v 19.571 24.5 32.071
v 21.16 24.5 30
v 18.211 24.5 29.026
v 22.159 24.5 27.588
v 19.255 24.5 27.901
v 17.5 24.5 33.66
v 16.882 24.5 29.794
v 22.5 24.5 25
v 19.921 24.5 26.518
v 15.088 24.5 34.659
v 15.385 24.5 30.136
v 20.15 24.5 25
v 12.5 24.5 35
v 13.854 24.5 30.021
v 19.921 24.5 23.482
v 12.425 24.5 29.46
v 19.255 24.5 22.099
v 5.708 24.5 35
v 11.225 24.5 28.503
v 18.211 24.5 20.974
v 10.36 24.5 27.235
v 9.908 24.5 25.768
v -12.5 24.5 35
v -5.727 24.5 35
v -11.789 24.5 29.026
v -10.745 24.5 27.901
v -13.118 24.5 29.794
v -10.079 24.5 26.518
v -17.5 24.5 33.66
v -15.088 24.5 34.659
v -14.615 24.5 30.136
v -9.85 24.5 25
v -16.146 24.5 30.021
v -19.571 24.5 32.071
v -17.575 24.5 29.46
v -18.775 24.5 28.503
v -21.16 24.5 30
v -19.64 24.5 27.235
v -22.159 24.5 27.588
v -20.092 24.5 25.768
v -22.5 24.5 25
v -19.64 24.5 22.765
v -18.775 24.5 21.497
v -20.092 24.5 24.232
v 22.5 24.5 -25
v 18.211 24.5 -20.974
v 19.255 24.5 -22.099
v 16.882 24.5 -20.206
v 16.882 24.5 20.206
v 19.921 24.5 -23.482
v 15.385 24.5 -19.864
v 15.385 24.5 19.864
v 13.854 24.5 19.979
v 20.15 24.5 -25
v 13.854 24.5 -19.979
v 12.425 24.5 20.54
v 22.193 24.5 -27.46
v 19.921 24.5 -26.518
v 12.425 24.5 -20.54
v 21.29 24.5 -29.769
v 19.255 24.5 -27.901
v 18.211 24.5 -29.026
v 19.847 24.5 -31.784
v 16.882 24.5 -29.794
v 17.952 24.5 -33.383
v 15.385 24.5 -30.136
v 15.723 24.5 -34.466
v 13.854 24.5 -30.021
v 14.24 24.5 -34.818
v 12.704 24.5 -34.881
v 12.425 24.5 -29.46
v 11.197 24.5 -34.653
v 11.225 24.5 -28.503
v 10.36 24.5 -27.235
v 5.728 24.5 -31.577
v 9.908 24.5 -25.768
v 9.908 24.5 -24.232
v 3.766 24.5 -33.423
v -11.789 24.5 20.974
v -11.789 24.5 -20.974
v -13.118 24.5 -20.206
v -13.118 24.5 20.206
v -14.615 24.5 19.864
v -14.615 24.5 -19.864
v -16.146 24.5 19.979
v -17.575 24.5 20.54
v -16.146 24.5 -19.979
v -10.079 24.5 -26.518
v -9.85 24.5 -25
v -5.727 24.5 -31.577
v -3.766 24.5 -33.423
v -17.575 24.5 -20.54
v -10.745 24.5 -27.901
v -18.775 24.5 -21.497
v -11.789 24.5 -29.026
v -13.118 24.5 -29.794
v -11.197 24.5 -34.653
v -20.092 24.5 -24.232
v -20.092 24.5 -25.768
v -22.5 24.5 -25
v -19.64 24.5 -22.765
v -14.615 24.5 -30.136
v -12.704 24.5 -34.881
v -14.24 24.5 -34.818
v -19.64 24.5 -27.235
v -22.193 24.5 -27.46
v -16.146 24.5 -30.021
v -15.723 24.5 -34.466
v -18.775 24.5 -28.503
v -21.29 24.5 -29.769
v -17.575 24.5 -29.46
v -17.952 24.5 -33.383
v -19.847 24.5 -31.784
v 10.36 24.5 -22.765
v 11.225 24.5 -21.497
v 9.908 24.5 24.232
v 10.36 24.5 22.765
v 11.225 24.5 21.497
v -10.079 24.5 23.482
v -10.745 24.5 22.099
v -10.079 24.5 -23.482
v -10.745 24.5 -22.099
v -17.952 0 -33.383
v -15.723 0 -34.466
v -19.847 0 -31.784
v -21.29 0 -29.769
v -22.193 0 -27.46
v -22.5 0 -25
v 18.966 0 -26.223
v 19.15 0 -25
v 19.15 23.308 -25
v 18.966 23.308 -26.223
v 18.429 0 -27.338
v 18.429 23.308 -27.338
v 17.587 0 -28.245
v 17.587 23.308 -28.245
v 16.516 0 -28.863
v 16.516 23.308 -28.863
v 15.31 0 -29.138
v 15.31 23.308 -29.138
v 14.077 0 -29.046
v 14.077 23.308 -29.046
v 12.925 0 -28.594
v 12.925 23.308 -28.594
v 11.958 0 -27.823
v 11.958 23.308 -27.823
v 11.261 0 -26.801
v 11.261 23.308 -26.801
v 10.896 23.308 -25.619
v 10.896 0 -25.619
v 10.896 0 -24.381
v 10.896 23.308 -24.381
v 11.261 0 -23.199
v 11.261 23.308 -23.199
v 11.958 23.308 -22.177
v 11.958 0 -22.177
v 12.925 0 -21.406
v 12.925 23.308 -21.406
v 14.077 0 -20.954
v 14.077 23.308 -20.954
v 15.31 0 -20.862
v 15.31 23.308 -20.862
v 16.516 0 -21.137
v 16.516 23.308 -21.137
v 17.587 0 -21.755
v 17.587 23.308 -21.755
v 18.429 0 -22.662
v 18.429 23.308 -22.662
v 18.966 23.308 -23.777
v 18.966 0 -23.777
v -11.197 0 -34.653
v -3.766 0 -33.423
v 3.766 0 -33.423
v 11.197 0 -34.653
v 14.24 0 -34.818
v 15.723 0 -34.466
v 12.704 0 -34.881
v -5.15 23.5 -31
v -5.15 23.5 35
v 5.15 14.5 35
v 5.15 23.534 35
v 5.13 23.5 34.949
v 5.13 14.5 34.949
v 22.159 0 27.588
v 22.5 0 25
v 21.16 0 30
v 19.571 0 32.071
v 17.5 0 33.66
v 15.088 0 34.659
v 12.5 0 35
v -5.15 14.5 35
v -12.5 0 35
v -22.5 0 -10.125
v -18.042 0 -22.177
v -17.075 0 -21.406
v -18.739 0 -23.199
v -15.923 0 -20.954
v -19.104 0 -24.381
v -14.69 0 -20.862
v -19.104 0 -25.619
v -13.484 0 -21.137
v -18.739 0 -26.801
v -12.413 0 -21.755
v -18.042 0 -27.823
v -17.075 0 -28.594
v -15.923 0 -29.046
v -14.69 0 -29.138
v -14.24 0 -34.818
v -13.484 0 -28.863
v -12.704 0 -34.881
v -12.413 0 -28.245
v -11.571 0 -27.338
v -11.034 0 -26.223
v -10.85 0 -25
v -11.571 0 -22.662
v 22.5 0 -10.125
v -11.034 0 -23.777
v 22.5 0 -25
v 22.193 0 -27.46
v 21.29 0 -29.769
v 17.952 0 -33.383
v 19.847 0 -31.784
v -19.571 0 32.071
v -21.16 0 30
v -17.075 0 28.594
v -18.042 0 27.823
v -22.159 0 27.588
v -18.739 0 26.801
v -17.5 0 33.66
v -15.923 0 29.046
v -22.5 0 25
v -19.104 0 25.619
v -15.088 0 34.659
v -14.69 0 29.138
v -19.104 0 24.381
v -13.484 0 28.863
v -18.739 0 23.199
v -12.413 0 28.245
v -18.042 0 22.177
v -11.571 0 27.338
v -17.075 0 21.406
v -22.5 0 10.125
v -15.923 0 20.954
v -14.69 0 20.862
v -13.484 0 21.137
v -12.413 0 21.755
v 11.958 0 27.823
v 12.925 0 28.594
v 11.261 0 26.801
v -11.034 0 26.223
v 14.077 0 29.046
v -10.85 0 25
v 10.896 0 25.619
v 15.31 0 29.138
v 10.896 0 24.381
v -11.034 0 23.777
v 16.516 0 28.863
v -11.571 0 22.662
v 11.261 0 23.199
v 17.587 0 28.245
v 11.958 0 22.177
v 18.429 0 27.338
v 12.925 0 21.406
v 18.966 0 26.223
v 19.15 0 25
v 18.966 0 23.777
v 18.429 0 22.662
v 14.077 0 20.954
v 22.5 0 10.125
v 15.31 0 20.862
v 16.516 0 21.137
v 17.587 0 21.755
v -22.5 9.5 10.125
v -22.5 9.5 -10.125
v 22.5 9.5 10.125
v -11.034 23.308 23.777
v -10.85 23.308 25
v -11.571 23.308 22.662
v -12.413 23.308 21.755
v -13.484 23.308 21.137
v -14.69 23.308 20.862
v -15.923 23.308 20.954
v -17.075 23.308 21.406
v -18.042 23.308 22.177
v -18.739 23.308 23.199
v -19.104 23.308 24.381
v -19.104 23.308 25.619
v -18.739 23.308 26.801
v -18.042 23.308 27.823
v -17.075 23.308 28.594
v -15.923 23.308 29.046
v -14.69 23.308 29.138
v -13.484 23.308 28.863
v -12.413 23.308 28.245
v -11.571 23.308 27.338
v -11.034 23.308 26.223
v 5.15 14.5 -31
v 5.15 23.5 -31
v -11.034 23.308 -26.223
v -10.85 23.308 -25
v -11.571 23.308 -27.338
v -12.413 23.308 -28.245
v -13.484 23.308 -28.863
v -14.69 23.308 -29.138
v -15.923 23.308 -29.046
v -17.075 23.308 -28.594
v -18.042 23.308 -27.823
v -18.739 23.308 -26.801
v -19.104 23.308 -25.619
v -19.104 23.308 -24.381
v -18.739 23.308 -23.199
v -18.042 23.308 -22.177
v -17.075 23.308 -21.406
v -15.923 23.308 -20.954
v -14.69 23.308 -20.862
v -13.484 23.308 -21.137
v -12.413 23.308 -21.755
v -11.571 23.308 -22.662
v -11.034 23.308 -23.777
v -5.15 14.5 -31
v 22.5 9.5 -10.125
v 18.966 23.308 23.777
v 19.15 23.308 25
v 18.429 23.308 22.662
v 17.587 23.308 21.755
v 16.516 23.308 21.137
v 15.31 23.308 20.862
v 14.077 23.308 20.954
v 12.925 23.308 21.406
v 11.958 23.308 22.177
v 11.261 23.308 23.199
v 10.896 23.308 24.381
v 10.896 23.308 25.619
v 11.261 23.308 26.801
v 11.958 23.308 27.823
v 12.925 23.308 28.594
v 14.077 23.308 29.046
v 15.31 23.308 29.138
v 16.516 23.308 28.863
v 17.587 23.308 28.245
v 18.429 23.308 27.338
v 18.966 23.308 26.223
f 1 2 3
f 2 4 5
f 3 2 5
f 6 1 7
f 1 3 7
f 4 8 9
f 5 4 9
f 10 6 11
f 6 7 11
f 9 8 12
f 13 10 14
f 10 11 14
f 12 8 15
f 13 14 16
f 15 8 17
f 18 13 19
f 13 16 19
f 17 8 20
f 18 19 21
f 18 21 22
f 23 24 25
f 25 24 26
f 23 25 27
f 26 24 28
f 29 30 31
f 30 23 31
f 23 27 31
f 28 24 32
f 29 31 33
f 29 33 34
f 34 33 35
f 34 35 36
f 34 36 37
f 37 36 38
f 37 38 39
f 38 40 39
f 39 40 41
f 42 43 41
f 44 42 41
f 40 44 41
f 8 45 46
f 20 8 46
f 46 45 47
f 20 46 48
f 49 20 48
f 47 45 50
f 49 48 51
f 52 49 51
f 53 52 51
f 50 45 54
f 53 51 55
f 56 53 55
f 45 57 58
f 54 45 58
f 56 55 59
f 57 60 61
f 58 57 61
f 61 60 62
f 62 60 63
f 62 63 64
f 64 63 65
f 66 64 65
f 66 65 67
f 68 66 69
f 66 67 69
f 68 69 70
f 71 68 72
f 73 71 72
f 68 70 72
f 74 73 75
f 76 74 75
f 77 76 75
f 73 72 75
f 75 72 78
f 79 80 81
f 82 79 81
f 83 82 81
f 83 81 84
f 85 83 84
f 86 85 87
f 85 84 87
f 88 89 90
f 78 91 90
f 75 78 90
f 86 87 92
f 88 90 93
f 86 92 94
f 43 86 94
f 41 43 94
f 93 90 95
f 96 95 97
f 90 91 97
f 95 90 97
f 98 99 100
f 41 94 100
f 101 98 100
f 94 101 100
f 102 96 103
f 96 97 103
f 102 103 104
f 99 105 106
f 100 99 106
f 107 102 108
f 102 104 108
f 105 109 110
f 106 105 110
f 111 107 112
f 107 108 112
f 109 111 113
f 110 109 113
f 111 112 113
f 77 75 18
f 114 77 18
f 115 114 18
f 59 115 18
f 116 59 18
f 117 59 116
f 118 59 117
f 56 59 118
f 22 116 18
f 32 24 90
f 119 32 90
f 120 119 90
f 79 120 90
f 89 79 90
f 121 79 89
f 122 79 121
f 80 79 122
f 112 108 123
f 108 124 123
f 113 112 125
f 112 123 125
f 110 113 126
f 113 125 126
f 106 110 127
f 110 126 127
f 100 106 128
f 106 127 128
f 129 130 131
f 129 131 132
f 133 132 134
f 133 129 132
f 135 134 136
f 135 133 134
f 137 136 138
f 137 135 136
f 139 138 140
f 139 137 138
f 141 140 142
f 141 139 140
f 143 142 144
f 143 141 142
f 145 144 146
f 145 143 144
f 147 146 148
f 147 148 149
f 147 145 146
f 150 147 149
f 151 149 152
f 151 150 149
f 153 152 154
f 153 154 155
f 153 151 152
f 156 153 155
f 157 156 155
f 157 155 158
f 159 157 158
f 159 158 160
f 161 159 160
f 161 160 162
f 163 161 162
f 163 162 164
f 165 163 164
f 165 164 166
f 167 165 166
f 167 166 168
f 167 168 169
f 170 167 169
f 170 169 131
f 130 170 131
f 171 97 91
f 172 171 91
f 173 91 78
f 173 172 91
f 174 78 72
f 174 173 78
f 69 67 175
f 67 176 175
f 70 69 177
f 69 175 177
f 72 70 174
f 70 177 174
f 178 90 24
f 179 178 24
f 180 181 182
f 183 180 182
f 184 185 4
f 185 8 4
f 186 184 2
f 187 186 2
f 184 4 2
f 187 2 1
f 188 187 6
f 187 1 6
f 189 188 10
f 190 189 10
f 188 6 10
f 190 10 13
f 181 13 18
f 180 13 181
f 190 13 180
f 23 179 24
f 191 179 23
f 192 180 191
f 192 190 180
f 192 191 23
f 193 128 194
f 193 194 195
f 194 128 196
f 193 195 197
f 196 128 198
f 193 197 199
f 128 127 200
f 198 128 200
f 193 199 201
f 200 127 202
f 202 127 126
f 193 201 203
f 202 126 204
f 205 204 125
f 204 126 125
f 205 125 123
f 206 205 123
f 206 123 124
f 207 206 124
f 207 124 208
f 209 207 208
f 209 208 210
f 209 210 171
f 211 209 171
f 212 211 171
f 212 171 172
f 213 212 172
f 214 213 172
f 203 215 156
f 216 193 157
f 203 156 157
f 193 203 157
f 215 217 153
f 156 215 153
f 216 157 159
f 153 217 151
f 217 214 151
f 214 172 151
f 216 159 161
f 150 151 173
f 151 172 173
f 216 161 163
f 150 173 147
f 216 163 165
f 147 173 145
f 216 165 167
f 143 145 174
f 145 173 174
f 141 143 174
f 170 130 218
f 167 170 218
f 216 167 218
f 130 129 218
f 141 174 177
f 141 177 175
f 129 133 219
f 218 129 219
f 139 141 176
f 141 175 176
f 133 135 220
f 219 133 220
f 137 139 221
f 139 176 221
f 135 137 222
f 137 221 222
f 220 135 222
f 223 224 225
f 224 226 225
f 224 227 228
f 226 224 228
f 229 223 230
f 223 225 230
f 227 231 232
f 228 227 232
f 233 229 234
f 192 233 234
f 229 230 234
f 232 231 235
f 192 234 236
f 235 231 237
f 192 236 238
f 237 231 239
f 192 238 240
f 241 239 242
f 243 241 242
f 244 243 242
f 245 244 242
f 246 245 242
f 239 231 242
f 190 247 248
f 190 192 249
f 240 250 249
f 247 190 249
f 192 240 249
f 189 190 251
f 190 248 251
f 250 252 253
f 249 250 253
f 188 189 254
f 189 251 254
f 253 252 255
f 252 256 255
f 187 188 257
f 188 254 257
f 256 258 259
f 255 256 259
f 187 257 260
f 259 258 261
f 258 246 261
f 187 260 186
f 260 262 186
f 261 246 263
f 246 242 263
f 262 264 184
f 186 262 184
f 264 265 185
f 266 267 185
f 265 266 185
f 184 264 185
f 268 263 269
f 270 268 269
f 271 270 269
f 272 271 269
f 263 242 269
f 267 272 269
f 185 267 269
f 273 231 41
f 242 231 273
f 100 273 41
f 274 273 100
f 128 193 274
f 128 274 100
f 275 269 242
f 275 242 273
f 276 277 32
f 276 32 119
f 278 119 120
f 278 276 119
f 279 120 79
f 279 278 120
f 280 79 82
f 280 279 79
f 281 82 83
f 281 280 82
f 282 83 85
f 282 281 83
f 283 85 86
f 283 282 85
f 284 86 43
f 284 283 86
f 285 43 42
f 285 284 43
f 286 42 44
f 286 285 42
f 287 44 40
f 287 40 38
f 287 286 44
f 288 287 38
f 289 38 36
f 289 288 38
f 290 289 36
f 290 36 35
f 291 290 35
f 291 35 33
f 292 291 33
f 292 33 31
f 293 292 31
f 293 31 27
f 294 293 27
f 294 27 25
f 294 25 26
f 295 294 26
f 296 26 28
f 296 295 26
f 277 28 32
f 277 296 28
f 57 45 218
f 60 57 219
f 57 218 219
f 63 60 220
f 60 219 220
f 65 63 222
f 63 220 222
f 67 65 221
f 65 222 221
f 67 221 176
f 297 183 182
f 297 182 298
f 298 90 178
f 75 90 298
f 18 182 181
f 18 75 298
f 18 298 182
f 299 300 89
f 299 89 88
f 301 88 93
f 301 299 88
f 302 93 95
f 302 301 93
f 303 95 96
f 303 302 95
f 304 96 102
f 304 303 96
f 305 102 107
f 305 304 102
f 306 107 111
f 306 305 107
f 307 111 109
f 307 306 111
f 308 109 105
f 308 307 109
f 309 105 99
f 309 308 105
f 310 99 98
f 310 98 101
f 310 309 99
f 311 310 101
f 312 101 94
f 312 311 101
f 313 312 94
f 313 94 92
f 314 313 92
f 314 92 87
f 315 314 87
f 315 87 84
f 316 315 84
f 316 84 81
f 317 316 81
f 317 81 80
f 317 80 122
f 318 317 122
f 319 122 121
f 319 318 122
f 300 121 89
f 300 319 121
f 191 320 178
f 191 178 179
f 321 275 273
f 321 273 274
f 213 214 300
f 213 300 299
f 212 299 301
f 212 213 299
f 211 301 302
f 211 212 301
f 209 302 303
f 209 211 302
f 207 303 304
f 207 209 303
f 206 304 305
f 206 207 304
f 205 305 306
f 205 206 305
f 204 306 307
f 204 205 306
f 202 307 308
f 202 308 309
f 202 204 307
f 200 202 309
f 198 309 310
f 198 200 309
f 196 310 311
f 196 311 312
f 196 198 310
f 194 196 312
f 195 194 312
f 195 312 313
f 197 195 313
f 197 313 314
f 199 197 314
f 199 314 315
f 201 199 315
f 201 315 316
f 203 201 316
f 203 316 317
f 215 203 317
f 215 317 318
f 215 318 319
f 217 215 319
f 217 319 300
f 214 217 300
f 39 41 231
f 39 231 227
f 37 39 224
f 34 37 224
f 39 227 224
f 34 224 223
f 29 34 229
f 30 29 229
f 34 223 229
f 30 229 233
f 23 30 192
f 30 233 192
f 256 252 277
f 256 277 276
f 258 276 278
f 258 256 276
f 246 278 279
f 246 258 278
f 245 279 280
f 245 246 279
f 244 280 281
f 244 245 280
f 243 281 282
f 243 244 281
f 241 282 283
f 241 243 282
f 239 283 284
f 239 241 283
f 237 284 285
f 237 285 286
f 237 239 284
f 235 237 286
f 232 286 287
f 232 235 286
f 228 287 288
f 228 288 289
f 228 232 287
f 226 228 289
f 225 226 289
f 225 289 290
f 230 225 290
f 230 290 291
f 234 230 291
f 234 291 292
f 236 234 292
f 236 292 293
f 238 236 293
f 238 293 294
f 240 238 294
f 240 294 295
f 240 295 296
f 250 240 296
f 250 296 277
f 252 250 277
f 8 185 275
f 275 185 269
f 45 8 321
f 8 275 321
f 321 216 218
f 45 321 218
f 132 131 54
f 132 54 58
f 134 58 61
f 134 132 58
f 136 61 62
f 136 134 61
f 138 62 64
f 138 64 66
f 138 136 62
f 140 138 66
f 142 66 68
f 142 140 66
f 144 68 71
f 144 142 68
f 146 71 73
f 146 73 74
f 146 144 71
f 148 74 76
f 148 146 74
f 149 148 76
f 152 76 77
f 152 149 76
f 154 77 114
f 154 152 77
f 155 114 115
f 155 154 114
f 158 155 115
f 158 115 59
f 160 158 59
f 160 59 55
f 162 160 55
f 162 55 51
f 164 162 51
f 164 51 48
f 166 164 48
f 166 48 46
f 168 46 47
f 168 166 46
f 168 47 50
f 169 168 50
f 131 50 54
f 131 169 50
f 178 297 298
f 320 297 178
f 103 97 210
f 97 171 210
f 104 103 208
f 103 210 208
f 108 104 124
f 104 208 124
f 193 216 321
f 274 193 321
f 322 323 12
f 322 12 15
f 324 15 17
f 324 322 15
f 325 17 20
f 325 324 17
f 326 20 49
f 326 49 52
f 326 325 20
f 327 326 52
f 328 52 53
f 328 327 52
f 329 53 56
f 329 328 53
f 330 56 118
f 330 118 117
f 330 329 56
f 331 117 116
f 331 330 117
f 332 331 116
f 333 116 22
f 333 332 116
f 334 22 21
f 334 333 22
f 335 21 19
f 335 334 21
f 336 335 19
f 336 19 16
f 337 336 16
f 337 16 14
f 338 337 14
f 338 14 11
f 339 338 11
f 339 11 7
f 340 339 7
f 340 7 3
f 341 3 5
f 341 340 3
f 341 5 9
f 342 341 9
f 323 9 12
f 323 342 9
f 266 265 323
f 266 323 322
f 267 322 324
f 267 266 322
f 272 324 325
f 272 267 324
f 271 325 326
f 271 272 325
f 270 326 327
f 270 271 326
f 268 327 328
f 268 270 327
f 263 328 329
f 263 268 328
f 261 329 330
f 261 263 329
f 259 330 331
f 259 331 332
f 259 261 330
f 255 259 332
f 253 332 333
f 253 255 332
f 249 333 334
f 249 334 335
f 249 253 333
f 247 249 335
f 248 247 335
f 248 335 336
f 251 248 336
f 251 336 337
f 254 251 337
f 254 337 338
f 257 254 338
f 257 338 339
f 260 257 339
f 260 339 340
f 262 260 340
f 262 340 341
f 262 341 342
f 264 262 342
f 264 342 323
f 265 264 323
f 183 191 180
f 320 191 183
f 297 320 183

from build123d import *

# Parameters (mm, degrees)
SKETCH1_W               = 45
SKETCH1_H               = 70
BOSS_EXTRUDE1_DEPTH     = 14.5
SKETCH2_W               = 20.25
SKETCH2_H               = 9.5
CUT_EXTRUDE1_DEPTH      = 1
CUT_EXTRUDE1_DEPTH_BACK = 46
SKETCH3_R               = 4.15
CUT_EXTRUDE2_DEPTH      = 15.5
SKETCH5_R               = 4.15
BOSS_EXTRUDE2_DEPTH     = 10
CHAMFER1_SIZE           = 1
CHAMFER1_SIZE2          = 1.191753593
CHAMFER2_SIZE           = 1
CHAMFER2_SIZE2          = 0.577350269
CHAMFER2_PART_2_SIZE    = 1
CHAMFER2_PART_2_SIZE2   = 0.577350269
CHAMFER2_PART_3_SIZE    = 1
CHAMFER2_PART_3_SIZE2   = 0.577350269
FILLET1_R               = 10
CUT_EXTRUDE3_DEPTH      = 25.5
FILLET2_R               = 8


with BuildPart() as part:
    # Sketch1 → Boss-Extrude1 (new body)
    with BuildSketch(Plane(origin=(0, 0, 0), x_dir=(1, 0, 0), z_dir=(0, 1, 0))):
        Rectangle(SKETCH1_W, SKETCH1_H)
    extrude(amount=BOSS_EXTRUDE1_DEPTH)

    # Sketch2 → Cut-Extrude1 (cut, two sides)
    with BuildSketch(Plane(origin=(22.5, 0, 0), x_dir=(0, 0, -1), z_dir=(1, 0, 0))) as cut_extrude1_sk:
        with Locations((0, 4.75)):
            Rectangle(SKETCH2_W, SKETCH2_H)
    extrude(amount=CUT_EXTRUDE1_DEPTH, mode=Mode.SUBTRACT)
    extrude(cut_extrude1_sk.sketch, amount=-CUT_EXTRUDE1_DEPTH_BACK, mode=Mode.SUBTRACT)

    # Sketch3 → Cut-Extrude2 (cut, through all)
    with BuildSketch(Plane.XZ):
        with Locations((15, 25)):
            Circle(SKETCH3_R)
        with Locations((15, -25)):
            Circle(SKETCH3_R)
        with Locations((-15, -25)):
            Circle(SKETCH3_R)
        with Locations((-15, 25)):
            Circle(SKETCH3_R)
    extrude(amount=-CUT_EXTRUDE2_DEPTH, mode=Mode.SUBTRACT)

    # Sketch5 → Boss-Extrude2 (add)
    with BuildSketch(Plane(origin=(0, 14.5, 0), x_dir=(1, 0, 0), z_dir=(0, 1, 0))):
        Polygon((-5.15, -35), (-22.5, -35), (-22.5, 35), (22.5, 35), (22.5, -35), (5.15, -35), (5.130229348, -34.949305848), (5.15, 31), (-5.15, 31), align=None)
        with Locations((-15, 25)):
            Circle(SKETCH5_R, mode=Mode.SUBTRACT)
        with Locations((15, 25)):
            Circle(SKETCH5_R, mode=Mode.SUBTRACT)
        with Locations((15, -25)):
            Circle(SKETCH5_R, mode=Mode.SUBTRACT)
        with Locations((-15, -25)):
            Circle(SKETCH5_R, mode=Mode.SUBTRACT)
    extrude(amount=BOSS_EXTRUDE2_DEPTH)

    # Chamfer1
    chamfer1_edges = [part.edges().sort_by_distance(p)[0] for p in [
        (-19.15, 24.5, -25),
        (10.85, 24.5, -25),
        (10.85, 24.5, 25),
        (-19.15, 24.5, 25),
    ]]
    chamfer1_side = [part.faces().sort_by_distance(p)[0] for p in [
        (-13.825, 24.5, 34.167834151),
    ]]
    chamfer(chamfer1_edges, length=CHAMFER1_SIZE, length2=CHAMFER1_SIZE2, reference=chamfer1_side[0])

    # Chamfer2
    chamfer2_edges = [part.edges().sort_by_distance(p)[0] for p in [
        (-5.15, 24.5, 2),
    ]]
    chamfer2_side = [part.faces().sort_by_distance(p)[0] for p in [
        (-5.15, 19.5, 2),
    ]]
    chamfer(chamfer2_edges, length=CHAMFER2_SIZE, length2=CHAMFER2_SIZE2, reference=chamfer2_side[0])

    # Chamfer2 part 2
    chamfer2_part_2_edges = [part.edges().sort_by_distance(p)[0] for p in [
        (0, 24.5, -31),
    ]]
    chamfer2_part_2_side = [part.faces().sort_by_distance(p)[0] for p in [
        (0, 19.5, -31),
    ]]
    chamfer(chamfer2_part_2_edges, length=CHAMFER2_PART_2_SIZE, length2=CHAMFER2_PART_2_SIZE2, reference=chamfer2_part_2_side[0])

    # Chamfer2 part 3
    chamfer2_part_3_edges = [part.edges().sort_by_distance(p)[0] for p in [
        (5.140114674, 24.5, 1.974652924),
    ]]
    chamfer2_part_3_side = [part.faces().sort_by_distance(p)[0] for p in [
        (5.140114674, 19.5, 1.974652924),
    ]]
    chamfer(chamfer2_part_3_edges, length=CHAMFER2_PART_3_SIZE, length2=CHAMFER2_PART_3_SIZE2, reference=chamfer2_part_3_side[0])

    # Fillet1
    fillet1_edges = [part.edges().sort_by_distance(p)[0] for p in [
        (-22.5, 12.25, -35),
        (22.5, 12.25, -35),
        (22.5, 12.25, 35),
        (-22.5, 12.25, 35),
    ]]
    fillet(fillet1_edges, radius=FILLET1_R)

    # Sketch6 → Cut-Extrude3 (cut, through all)
    with BuildSketch(Plane.XZ):
        with BuildLine():
            Line((12.5, -35), (-12.5, -35))
            ThreePointArc((-12.5, -35), (0, -33.26906369), (12.5, -35))
        make_face()
    extrude(amount=-CUT_EXTRUDE3_DEPTH, mode=Mode.SUBTRACT)

    # Fillet2
    fillet2_edges = [part.edges().sort_by_distance(p)[0] for p in [
        (12.5, 12.25, -35),
        (-12.5, 12.25, -35),
    ]]
    fillet(fillet2_edges, radius=FILLET2_R)


solid = part.part
